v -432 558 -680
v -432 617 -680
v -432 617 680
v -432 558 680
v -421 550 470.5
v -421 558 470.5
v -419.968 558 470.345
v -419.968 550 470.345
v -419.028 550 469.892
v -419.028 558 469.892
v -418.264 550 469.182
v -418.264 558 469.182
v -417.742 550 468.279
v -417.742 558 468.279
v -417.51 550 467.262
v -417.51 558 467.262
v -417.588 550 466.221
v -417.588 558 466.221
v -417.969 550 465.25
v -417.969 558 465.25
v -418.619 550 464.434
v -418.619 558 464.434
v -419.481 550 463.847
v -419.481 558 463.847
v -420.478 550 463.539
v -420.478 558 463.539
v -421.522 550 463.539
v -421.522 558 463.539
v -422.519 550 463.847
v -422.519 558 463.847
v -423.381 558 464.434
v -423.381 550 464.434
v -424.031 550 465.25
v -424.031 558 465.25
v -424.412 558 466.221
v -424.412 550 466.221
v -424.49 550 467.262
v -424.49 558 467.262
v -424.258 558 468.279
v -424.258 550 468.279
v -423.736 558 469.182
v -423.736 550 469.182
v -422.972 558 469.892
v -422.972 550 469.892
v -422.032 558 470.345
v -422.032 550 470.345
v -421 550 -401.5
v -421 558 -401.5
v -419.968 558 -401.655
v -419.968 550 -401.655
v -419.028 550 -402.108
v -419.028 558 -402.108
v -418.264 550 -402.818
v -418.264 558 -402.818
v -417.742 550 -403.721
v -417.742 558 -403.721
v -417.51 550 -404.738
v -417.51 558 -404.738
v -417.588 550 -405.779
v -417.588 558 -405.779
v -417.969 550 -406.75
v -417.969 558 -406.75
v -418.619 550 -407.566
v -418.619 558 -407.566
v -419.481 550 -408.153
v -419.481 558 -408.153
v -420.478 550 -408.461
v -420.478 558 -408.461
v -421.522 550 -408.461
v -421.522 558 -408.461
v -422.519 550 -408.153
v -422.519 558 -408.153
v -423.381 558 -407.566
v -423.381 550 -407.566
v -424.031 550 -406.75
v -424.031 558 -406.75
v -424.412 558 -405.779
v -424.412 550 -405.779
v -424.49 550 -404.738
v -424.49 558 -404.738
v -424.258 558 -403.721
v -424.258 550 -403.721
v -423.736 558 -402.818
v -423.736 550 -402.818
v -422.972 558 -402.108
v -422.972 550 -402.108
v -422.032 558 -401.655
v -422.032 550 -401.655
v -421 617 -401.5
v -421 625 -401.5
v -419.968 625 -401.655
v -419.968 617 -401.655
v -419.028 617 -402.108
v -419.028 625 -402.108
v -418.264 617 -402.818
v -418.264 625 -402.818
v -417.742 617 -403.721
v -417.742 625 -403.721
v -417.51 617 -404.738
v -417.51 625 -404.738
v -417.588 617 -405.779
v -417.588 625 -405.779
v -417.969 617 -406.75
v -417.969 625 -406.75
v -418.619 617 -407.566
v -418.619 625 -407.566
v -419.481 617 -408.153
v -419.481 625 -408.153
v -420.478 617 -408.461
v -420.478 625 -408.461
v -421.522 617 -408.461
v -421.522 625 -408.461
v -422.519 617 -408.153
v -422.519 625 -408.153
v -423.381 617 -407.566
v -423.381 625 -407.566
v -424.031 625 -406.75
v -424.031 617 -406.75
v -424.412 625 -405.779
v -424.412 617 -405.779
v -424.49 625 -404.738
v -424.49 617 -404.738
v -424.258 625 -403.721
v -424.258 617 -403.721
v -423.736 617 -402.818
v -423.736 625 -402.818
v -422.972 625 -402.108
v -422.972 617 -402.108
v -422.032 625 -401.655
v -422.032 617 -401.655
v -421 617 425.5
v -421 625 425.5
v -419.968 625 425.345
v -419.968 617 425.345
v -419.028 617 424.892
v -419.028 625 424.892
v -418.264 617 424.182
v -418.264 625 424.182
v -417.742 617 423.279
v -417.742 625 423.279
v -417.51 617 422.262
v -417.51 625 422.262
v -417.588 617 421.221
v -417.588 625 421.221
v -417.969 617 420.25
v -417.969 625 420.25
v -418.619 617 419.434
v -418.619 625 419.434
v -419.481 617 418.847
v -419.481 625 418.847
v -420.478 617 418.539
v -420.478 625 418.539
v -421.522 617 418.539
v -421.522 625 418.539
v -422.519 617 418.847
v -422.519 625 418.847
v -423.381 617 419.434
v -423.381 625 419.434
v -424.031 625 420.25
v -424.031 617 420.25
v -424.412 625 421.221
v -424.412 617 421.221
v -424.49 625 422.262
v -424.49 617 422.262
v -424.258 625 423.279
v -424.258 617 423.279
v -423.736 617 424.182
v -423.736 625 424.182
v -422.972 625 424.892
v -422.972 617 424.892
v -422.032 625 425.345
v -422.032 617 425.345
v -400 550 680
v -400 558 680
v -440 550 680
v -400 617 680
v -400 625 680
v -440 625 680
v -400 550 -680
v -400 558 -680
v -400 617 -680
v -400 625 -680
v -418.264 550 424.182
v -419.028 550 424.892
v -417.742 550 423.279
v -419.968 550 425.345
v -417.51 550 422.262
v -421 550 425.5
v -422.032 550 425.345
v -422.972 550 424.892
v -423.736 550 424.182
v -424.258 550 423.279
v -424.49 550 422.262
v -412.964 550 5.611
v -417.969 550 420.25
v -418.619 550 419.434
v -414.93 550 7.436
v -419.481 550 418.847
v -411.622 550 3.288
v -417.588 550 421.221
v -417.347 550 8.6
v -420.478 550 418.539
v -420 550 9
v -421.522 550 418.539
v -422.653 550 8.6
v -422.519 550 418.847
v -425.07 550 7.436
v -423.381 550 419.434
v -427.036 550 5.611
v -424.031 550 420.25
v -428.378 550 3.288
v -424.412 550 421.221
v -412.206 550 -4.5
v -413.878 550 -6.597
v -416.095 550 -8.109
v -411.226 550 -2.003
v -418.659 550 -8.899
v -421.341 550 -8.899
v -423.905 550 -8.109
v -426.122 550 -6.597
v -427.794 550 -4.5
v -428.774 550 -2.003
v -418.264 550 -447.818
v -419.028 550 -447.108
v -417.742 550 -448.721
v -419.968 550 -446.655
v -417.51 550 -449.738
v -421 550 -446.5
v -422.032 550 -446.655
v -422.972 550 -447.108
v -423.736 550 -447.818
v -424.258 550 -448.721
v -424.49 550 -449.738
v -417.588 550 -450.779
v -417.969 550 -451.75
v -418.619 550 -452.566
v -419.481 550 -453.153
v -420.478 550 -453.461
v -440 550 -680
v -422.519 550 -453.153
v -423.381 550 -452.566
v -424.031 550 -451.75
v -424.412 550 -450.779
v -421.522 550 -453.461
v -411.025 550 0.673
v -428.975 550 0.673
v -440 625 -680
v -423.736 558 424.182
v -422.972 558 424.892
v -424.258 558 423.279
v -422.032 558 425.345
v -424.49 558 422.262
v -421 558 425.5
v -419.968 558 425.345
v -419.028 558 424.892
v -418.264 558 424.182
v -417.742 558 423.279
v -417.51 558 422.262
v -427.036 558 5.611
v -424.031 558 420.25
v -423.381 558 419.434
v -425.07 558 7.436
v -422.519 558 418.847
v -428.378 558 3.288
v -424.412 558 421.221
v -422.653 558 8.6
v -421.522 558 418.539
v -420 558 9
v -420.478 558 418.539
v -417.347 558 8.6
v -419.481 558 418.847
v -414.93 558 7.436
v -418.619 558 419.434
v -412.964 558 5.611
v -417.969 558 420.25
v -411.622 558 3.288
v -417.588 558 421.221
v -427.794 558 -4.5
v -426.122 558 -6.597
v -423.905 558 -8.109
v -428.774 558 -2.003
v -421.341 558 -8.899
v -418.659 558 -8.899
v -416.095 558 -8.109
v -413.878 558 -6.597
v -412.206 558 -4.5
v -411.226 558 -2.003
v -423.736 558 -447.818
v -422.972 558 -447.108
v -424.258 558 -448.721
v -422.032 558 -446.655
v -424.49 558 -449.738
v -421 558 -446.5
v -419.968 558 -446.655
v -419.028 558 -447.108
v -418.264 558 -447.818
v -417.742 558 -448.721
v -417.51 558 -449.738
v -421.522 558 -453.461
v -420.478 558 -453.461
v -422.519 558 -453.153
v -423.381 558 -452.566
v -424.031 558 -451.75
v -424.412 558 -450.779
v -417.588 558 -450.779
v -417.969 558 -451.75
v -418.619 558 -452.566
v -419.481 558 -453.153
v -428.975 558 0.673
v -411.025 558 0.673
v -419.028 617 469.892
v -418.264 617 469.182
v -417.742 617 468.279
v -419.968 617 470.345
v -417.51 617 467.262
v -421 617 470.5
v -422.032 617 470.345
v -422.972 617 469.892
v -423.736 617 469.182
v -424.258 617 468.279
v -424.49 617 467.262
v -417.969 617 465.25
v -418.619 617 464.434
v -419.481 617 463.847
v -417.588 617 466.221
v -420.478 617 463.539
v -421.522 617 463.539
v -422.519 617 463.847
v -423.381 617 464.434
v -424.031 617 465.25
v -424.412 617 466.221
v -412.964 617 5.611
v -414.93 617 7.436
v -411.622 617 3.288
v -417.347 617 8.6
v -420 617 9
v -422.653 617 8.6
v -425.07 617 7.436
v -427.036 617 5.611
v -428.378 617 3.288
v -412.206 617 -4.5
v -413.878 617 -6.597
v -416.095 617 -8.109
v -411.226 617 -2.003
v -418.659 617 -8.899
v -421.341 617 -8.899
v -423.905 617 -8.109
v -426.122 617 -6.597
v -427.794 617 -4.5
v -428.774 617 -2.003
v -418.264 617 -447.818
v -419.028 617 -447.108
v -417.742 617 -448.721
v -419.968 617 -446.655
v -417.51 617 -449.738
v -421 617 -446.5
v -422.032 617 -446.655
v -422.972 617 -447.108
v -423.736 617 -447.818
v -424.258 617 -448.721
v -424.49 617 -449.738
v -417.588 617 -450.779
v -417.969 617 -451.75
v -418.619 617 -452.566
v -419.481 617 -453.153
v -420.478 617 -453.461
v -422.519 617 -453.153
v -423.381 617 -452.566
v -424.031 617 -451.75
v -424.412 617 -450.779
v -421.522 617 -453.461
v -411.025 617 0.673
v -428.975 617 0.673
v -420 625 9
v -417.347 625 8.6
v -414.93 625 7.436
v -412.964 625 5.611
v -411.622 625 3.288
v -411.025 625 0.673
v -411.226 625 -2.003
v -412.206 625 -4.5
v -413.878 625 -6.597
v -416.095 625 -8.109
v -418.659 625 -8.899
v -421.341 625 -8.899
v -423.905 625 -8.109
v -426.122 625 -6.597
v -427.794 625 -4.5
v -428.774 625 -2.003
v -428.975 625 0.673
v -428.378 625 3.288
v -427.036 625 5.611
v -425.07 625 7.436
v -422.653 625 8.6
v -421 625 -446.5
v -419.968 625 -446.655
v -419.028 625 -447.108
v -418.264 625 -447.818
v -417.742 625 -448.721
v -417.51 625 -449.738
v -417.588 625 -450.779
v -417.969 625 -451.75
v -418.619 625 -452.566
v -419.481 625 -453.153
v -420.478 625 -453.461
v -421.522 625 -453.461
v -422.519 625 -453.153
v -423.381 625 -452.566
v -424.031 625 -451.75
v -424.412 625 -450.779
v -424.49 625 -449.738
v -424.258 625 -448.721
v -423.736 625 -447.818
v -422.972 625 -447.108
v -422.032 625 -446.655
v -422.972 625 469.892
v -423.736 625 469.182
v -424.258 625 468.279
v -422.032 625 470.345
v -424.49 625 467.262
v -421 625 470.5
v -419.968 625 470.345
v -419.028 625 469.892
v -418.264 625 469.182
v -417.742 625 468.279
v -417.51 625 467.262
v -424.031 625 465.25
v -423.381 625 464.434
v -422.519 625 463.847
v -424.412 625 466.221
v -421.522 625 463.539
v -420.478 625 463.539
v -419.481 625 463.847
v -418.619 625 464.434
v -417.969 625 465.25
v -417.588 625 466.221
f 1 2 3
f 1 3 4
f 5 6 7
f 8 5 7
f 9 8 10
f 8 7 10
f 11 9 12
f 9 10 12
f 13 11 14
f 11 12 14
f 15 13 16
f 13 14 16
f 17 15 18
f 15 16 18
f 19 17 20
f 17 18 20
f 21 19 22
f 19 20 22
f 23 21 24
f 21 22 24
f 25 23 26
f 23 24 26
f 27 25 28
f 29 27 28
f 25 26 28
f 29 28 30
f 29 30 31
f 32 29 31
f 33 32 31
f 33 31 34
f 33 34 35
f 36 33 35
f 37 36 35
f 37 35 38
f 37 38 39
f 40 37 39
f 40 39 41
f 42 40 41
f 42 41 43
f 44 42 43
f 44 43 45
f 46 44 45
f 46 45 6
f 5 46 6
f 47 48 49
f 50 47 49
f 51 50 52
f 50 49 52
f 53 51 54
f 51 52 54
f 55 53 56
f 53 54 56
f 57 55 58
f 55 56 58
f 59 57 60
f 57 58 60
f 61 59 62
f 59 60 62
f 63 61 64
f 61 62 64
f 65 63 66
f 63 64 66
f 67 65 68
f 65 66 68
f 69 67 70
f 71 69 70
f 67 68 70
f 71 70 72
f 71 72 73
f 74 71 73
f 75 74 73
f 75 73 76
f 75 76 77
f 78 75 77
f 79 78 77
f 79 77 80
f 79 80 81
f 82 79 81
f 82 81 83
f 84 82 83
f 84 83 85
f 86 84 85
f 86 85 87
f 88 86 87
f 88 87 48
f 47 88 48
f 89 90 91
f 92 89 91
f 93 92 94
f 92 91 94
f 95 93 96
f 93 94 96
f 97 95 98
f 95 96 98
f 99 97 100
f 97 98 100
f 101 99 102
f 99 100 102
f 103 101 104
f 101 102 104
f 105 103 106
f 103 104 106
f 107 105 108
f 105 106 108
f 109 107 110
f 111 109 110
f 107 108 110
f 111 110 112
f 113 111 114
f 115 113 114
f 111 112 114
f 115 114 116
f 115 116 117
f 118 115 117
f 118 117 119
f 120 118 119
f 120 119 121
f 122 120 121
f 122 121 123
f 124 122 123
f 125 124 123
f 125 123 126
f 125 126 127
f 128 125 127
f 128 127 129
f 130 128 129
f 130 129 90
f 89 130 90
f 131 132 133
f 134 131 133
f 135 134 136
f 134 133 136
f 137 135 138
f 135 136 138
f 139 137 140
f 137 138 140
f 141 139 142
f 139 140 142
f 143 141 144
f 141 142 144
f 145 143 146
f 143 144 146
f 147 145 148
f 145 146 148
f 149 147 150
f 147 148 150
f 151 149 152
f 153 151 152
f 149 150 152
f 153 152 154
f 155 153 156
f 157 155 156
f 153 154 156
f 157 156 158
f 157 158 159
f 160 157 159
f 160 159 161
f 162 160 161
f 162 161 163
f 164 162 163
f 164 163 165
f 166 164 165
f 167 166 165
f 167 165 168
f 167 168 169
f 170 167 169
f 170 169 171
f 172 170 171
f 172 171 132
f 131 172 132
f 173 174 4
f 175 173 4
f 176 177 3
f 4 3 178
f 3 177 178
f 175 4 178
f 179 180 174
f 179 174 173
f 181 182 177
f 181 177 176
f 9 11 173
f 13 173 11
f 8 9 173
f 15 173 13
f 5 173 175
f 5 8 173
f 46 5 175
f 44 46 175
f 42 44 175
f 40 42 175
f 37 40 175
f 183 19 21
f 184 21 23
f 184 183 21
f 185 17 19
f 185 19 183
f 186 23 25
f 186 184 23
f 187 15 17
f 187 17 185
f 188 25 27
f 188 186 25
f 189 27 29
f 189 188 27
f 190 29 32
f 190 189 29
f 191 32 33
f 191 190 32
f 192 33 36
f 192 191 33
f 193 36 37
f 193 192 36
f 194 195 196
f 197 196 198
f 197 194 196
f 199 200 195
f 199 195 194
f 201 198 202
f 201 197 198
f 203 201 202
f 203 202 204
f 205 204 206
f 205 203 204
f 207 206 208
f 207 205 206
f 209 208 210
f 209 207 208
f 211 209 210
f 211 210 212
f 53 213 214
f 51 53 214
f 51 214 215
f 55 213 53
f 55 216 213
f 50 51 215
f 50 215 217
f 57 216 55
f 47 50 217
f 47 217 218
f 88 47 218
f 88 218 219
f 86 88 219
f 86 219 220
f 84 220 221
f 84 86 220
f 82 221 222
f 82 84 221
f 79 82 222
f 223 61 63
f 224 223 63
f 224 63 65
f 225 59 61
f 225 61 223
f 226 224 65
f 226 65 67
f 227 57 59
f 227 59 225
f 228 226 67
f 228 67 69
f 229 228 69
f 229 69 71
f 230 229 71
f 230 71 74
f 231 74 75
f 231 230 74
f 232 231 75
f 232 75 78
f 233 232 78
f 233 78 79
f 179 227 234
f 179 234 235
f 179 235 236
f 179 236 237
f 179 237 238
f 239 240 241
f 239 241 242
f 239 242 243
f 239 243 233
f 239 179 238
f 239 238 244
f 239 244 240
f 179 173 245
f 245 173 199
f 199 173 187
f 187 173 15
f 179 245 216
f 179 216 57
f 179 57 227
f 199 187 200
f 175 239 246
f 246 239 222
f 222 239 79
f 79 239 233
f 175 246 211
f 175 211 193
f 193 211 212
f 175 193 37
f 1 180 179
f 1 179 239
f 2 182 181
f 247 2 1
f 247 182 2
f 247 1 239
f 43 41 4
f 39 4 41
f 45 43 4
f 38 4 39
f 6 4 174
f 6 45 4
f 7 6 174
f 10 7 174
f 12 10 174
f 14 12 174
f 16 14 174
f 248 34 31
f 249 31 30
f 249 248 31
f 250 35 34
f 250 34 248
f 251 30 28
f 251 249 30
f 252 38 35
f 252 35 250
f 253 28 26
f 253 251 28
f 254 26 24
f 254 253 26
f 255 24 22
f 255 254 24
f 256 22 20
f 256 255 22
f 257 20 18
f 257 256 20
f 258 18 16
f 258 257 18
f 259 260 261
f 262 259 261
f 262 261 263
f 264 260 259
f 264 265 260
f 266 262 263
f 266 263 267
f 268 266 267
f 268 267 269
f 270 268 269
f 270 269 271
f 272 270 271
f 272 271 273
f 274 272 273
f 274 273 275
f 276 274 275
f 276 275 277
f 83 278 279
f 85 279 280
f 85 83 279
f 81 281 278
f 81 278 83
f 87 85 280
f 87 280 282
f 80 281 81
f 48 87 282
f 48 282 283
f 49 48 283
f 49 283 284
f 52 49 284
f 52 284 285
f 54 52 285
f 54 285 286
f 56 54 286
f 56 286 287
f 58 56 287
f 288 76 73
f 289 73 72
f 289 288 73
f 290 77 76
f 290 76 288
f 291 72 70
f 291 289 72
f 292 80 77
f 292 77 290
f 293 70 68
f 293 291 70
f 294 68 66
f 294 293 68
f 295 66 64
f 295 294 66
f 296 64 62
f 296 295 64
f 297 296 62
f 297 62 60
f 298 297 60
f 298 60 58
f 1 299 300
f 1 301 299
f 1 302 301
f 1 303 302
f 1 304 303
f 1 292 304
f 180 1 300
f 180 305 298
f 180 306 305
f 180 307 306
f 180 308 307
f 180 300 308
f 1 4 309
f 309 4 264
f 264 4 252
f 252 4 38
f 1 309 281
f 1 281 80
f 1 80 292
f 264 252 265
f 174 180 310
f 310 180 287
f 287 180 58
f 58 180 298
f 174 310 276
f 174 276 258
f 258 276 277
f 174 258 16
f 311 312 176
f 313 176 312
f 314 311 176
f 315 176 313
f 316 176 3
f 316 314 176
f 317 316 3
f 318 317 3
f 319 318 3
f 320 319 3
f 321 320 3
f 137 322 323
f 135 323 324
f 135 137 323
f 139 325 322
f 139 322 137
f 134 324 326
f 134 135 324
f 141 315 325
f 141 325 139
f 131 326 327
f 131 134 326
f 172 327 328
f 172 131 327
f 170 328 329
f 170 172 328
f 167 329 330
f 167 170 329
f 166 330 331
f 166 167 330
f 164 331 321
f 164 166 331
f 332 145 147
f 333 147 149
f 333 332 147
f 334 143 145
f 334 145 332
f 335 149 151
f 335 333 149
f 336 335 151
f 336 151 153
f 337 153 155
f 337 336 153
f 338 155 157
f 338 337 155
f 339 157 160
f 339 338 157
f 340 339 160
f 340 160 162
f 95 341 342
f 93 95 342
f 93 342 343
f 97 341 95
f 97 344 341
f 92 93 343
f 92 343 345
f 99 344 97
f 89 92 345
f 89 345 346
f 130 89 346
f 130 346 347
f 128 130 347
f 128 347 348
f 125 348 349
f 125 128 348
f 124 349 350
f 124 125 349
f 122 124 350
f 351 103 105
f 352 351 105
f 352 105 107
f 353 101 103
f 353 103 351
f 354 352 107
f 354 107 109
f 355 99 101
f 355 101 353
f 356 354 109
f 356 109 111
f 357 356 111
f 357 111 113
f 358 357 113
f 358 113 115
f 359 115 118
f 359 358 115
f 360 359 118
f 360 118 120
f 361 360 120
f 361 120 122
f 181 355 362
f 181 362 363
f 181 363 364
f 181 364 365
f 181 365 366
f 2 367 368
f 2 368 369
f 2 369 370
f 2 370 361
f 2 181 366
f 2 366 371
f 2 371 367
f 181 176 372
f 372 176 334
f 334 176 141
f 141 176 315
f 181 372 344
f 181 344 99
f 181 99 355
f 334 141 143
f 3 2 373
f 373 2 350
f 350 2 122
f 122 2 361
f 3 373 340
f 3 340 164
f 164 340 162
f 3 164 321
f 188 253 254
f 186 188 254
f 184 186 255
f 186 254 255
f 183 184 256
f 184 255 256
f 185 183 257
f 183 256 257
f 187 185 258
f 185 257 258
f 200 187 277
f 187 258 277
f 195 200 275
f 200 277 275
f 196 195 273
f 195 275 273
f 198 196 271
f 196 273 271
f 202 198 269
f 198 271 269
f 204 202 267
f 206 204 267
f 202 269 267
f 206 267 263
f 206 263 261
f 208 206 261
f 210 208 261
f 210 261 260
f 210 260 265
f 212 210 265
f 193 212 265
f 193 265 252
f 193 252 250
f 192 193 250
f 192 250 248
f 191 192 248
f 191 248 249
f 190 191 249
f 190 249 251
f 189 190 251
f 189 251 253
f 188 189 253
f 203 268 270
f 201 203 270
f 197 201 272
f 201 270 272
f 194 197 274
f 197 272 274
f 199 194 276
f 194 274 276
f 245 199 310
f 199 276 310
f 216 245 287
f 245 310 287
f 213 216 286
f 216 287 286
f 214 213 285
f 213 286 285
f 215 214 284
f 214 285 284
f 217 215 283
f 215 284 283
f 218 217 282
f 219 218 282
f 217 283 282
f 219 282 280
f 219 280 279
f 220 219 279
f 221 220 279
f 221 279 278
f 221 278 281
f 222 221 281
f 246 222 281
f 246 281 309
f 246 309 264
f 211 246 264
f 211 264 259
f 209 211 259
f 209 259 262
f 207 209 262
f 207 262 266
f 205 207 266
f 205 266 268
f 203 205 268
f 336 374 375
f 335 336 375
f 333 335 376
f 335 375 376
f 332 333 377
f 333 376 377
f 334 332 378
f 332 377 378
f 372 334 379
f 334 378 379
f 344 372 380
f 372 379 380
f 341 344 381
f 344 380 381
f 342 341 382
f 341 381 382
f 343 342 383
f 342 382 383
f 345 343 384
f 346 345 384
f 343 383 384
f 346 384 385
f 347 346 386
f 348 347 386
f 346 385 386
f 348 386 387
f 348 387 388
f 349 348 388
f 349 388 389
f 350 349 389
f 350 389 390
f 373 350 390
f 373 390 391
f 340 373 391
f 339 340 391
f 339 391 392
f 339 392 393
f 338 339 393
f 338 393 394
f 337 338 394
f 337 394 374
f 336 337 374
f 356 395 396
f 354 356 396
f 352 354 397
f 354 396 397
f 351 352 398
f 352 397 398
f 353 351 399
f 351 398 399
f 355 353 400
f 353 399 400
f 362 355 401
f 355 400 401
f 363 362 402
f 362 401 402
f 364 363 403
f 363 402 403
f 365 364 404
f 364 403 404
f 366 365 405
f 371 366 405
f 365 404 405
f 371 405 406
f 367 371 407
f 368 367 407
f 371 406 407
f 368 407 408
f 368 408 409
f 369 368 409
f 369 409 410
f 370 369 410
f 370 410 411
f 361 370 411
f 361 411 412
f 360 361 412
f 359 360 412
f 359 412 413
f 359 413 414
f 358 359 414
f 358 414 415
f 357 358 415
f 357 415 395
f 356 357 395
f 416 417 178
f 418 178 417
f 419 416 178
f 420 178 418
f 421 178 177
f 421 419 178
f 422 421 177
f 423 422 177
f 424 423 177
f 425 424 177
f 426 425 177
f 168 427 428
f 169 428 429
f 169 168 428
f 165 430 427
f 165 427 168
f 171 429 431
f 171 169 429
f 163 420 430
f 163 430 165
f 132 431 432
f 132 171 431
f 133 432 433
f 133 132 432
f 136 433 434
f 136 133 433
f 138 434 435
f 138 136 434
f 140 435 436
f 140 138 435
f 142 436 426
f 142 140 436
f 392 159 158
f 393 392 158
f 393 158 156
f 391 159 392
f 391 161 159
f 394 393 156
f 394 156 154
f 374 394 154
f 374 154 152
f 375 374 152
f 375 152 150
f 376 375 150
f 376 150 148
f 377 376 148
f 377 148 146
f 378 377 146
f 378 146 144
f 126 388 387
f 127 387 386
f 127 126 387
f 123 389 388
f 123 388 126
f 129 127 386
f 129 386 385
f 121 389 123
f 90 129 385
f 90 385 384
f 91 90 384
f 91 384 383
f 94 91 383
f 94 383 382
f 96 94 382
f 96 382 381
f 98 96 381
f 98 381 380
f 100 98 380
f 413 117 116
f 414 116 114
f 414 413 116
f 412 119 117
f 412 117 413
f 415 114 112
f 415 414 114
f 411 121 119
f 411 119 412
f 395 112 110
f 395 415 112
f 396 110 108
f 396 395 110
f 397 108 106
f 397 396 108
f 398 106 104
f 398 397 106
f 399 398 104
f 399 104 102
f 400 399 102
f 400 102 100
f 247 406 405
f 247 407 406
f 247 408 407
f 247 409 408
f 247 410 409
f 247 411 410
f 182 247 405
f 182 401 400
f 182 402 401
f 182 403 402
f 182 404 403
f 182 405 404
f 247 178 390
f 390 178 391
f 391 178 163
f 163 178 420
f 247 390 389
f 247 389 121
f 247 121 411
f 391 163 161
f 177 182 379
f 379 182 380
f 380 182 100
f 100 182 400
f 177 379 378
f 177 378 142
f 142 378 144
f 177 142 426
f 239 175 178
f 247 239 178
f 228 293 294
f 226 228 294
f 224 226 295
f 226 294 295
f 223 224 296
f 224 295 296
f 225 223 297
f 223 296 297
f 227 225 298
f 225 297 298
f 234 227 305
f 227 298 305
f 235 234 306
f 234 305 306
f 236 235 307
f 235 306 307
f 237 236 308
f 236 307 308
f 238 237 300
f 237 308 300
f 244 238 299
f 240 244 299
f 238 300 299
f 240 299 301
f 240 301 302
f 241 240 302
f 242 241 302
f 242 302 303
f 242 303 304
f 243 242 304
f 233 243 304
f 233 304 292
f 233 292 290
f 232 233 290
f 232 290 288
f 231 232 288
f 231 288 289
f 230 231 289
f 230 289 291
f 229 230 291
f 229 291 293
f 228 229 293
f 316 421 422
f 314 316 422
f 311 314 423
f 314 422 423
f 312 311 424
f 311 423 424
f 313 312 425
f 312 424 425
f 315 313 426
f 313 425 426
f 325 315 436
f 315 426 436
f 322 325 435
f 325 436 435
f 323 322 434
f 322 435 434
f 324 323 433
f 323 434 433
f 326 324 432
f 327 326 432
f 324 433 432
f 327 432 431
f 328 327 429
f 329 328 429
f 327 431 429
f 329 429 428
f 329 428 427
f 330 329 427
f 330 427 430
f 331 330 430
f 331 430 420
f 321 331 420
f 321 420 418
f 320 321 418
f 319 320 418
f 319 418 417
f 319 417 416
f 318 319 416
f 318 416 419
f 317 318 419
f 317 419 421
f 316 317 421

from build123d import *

# Parameters (mm, degrees)
BOSS_EXTRUDE1_DEPTH = 1360
SKETCH2_R           = 3.5
SKETCH2_R_2         = 9
CUT_EXTRUDE1_DEPTH  = 814.403343981


with BuildPart() as part:
    # Sketch1 → Boss-Extrude1 (new body)
    with BuildSketch(Plane.XY.offset(-680)):
        Polygon((-440, 550), (-440, 625), (-400, 625), (-400, 617), (-432, 617), (-432, 558), (-400, 558), (-400, 550), align=None)
    extrude(amount=BOSS_EXTRUDE1_DEPTH)

    # Sketch2 → Cut-Extrude1 (cut, through all)
    with BuildSketch(Plane(origin=(0, 625, 0), x_dir=(1, 0, 0), z_dir=(0, 1, 0))):
        with Locations(Location((-421, -467, 0), (0, 0, 270))):
            Circle(SKETCH2_R)
        with Locations(Location((-421, -422, 0), (0, 0, 270))):
            Circle(SKETCH2_R)
        with Locations(Location((-420, 0, 0), (0, 0, 270))):
            Circle(SKETCH2_R_2)
        with Locations(Location((-421, 450, 0), (0, 0, 270))):
            Circle(SKETCH2_R)
        with Locations(Location((-421, 405, 0), (0, 0, 270))):
            Circle(SKETCH2_R)
    extrude(amount=-CUT_EXTRUDE1_DEPTH, mode=Mode.SUBTRACT)


solid = part.part
